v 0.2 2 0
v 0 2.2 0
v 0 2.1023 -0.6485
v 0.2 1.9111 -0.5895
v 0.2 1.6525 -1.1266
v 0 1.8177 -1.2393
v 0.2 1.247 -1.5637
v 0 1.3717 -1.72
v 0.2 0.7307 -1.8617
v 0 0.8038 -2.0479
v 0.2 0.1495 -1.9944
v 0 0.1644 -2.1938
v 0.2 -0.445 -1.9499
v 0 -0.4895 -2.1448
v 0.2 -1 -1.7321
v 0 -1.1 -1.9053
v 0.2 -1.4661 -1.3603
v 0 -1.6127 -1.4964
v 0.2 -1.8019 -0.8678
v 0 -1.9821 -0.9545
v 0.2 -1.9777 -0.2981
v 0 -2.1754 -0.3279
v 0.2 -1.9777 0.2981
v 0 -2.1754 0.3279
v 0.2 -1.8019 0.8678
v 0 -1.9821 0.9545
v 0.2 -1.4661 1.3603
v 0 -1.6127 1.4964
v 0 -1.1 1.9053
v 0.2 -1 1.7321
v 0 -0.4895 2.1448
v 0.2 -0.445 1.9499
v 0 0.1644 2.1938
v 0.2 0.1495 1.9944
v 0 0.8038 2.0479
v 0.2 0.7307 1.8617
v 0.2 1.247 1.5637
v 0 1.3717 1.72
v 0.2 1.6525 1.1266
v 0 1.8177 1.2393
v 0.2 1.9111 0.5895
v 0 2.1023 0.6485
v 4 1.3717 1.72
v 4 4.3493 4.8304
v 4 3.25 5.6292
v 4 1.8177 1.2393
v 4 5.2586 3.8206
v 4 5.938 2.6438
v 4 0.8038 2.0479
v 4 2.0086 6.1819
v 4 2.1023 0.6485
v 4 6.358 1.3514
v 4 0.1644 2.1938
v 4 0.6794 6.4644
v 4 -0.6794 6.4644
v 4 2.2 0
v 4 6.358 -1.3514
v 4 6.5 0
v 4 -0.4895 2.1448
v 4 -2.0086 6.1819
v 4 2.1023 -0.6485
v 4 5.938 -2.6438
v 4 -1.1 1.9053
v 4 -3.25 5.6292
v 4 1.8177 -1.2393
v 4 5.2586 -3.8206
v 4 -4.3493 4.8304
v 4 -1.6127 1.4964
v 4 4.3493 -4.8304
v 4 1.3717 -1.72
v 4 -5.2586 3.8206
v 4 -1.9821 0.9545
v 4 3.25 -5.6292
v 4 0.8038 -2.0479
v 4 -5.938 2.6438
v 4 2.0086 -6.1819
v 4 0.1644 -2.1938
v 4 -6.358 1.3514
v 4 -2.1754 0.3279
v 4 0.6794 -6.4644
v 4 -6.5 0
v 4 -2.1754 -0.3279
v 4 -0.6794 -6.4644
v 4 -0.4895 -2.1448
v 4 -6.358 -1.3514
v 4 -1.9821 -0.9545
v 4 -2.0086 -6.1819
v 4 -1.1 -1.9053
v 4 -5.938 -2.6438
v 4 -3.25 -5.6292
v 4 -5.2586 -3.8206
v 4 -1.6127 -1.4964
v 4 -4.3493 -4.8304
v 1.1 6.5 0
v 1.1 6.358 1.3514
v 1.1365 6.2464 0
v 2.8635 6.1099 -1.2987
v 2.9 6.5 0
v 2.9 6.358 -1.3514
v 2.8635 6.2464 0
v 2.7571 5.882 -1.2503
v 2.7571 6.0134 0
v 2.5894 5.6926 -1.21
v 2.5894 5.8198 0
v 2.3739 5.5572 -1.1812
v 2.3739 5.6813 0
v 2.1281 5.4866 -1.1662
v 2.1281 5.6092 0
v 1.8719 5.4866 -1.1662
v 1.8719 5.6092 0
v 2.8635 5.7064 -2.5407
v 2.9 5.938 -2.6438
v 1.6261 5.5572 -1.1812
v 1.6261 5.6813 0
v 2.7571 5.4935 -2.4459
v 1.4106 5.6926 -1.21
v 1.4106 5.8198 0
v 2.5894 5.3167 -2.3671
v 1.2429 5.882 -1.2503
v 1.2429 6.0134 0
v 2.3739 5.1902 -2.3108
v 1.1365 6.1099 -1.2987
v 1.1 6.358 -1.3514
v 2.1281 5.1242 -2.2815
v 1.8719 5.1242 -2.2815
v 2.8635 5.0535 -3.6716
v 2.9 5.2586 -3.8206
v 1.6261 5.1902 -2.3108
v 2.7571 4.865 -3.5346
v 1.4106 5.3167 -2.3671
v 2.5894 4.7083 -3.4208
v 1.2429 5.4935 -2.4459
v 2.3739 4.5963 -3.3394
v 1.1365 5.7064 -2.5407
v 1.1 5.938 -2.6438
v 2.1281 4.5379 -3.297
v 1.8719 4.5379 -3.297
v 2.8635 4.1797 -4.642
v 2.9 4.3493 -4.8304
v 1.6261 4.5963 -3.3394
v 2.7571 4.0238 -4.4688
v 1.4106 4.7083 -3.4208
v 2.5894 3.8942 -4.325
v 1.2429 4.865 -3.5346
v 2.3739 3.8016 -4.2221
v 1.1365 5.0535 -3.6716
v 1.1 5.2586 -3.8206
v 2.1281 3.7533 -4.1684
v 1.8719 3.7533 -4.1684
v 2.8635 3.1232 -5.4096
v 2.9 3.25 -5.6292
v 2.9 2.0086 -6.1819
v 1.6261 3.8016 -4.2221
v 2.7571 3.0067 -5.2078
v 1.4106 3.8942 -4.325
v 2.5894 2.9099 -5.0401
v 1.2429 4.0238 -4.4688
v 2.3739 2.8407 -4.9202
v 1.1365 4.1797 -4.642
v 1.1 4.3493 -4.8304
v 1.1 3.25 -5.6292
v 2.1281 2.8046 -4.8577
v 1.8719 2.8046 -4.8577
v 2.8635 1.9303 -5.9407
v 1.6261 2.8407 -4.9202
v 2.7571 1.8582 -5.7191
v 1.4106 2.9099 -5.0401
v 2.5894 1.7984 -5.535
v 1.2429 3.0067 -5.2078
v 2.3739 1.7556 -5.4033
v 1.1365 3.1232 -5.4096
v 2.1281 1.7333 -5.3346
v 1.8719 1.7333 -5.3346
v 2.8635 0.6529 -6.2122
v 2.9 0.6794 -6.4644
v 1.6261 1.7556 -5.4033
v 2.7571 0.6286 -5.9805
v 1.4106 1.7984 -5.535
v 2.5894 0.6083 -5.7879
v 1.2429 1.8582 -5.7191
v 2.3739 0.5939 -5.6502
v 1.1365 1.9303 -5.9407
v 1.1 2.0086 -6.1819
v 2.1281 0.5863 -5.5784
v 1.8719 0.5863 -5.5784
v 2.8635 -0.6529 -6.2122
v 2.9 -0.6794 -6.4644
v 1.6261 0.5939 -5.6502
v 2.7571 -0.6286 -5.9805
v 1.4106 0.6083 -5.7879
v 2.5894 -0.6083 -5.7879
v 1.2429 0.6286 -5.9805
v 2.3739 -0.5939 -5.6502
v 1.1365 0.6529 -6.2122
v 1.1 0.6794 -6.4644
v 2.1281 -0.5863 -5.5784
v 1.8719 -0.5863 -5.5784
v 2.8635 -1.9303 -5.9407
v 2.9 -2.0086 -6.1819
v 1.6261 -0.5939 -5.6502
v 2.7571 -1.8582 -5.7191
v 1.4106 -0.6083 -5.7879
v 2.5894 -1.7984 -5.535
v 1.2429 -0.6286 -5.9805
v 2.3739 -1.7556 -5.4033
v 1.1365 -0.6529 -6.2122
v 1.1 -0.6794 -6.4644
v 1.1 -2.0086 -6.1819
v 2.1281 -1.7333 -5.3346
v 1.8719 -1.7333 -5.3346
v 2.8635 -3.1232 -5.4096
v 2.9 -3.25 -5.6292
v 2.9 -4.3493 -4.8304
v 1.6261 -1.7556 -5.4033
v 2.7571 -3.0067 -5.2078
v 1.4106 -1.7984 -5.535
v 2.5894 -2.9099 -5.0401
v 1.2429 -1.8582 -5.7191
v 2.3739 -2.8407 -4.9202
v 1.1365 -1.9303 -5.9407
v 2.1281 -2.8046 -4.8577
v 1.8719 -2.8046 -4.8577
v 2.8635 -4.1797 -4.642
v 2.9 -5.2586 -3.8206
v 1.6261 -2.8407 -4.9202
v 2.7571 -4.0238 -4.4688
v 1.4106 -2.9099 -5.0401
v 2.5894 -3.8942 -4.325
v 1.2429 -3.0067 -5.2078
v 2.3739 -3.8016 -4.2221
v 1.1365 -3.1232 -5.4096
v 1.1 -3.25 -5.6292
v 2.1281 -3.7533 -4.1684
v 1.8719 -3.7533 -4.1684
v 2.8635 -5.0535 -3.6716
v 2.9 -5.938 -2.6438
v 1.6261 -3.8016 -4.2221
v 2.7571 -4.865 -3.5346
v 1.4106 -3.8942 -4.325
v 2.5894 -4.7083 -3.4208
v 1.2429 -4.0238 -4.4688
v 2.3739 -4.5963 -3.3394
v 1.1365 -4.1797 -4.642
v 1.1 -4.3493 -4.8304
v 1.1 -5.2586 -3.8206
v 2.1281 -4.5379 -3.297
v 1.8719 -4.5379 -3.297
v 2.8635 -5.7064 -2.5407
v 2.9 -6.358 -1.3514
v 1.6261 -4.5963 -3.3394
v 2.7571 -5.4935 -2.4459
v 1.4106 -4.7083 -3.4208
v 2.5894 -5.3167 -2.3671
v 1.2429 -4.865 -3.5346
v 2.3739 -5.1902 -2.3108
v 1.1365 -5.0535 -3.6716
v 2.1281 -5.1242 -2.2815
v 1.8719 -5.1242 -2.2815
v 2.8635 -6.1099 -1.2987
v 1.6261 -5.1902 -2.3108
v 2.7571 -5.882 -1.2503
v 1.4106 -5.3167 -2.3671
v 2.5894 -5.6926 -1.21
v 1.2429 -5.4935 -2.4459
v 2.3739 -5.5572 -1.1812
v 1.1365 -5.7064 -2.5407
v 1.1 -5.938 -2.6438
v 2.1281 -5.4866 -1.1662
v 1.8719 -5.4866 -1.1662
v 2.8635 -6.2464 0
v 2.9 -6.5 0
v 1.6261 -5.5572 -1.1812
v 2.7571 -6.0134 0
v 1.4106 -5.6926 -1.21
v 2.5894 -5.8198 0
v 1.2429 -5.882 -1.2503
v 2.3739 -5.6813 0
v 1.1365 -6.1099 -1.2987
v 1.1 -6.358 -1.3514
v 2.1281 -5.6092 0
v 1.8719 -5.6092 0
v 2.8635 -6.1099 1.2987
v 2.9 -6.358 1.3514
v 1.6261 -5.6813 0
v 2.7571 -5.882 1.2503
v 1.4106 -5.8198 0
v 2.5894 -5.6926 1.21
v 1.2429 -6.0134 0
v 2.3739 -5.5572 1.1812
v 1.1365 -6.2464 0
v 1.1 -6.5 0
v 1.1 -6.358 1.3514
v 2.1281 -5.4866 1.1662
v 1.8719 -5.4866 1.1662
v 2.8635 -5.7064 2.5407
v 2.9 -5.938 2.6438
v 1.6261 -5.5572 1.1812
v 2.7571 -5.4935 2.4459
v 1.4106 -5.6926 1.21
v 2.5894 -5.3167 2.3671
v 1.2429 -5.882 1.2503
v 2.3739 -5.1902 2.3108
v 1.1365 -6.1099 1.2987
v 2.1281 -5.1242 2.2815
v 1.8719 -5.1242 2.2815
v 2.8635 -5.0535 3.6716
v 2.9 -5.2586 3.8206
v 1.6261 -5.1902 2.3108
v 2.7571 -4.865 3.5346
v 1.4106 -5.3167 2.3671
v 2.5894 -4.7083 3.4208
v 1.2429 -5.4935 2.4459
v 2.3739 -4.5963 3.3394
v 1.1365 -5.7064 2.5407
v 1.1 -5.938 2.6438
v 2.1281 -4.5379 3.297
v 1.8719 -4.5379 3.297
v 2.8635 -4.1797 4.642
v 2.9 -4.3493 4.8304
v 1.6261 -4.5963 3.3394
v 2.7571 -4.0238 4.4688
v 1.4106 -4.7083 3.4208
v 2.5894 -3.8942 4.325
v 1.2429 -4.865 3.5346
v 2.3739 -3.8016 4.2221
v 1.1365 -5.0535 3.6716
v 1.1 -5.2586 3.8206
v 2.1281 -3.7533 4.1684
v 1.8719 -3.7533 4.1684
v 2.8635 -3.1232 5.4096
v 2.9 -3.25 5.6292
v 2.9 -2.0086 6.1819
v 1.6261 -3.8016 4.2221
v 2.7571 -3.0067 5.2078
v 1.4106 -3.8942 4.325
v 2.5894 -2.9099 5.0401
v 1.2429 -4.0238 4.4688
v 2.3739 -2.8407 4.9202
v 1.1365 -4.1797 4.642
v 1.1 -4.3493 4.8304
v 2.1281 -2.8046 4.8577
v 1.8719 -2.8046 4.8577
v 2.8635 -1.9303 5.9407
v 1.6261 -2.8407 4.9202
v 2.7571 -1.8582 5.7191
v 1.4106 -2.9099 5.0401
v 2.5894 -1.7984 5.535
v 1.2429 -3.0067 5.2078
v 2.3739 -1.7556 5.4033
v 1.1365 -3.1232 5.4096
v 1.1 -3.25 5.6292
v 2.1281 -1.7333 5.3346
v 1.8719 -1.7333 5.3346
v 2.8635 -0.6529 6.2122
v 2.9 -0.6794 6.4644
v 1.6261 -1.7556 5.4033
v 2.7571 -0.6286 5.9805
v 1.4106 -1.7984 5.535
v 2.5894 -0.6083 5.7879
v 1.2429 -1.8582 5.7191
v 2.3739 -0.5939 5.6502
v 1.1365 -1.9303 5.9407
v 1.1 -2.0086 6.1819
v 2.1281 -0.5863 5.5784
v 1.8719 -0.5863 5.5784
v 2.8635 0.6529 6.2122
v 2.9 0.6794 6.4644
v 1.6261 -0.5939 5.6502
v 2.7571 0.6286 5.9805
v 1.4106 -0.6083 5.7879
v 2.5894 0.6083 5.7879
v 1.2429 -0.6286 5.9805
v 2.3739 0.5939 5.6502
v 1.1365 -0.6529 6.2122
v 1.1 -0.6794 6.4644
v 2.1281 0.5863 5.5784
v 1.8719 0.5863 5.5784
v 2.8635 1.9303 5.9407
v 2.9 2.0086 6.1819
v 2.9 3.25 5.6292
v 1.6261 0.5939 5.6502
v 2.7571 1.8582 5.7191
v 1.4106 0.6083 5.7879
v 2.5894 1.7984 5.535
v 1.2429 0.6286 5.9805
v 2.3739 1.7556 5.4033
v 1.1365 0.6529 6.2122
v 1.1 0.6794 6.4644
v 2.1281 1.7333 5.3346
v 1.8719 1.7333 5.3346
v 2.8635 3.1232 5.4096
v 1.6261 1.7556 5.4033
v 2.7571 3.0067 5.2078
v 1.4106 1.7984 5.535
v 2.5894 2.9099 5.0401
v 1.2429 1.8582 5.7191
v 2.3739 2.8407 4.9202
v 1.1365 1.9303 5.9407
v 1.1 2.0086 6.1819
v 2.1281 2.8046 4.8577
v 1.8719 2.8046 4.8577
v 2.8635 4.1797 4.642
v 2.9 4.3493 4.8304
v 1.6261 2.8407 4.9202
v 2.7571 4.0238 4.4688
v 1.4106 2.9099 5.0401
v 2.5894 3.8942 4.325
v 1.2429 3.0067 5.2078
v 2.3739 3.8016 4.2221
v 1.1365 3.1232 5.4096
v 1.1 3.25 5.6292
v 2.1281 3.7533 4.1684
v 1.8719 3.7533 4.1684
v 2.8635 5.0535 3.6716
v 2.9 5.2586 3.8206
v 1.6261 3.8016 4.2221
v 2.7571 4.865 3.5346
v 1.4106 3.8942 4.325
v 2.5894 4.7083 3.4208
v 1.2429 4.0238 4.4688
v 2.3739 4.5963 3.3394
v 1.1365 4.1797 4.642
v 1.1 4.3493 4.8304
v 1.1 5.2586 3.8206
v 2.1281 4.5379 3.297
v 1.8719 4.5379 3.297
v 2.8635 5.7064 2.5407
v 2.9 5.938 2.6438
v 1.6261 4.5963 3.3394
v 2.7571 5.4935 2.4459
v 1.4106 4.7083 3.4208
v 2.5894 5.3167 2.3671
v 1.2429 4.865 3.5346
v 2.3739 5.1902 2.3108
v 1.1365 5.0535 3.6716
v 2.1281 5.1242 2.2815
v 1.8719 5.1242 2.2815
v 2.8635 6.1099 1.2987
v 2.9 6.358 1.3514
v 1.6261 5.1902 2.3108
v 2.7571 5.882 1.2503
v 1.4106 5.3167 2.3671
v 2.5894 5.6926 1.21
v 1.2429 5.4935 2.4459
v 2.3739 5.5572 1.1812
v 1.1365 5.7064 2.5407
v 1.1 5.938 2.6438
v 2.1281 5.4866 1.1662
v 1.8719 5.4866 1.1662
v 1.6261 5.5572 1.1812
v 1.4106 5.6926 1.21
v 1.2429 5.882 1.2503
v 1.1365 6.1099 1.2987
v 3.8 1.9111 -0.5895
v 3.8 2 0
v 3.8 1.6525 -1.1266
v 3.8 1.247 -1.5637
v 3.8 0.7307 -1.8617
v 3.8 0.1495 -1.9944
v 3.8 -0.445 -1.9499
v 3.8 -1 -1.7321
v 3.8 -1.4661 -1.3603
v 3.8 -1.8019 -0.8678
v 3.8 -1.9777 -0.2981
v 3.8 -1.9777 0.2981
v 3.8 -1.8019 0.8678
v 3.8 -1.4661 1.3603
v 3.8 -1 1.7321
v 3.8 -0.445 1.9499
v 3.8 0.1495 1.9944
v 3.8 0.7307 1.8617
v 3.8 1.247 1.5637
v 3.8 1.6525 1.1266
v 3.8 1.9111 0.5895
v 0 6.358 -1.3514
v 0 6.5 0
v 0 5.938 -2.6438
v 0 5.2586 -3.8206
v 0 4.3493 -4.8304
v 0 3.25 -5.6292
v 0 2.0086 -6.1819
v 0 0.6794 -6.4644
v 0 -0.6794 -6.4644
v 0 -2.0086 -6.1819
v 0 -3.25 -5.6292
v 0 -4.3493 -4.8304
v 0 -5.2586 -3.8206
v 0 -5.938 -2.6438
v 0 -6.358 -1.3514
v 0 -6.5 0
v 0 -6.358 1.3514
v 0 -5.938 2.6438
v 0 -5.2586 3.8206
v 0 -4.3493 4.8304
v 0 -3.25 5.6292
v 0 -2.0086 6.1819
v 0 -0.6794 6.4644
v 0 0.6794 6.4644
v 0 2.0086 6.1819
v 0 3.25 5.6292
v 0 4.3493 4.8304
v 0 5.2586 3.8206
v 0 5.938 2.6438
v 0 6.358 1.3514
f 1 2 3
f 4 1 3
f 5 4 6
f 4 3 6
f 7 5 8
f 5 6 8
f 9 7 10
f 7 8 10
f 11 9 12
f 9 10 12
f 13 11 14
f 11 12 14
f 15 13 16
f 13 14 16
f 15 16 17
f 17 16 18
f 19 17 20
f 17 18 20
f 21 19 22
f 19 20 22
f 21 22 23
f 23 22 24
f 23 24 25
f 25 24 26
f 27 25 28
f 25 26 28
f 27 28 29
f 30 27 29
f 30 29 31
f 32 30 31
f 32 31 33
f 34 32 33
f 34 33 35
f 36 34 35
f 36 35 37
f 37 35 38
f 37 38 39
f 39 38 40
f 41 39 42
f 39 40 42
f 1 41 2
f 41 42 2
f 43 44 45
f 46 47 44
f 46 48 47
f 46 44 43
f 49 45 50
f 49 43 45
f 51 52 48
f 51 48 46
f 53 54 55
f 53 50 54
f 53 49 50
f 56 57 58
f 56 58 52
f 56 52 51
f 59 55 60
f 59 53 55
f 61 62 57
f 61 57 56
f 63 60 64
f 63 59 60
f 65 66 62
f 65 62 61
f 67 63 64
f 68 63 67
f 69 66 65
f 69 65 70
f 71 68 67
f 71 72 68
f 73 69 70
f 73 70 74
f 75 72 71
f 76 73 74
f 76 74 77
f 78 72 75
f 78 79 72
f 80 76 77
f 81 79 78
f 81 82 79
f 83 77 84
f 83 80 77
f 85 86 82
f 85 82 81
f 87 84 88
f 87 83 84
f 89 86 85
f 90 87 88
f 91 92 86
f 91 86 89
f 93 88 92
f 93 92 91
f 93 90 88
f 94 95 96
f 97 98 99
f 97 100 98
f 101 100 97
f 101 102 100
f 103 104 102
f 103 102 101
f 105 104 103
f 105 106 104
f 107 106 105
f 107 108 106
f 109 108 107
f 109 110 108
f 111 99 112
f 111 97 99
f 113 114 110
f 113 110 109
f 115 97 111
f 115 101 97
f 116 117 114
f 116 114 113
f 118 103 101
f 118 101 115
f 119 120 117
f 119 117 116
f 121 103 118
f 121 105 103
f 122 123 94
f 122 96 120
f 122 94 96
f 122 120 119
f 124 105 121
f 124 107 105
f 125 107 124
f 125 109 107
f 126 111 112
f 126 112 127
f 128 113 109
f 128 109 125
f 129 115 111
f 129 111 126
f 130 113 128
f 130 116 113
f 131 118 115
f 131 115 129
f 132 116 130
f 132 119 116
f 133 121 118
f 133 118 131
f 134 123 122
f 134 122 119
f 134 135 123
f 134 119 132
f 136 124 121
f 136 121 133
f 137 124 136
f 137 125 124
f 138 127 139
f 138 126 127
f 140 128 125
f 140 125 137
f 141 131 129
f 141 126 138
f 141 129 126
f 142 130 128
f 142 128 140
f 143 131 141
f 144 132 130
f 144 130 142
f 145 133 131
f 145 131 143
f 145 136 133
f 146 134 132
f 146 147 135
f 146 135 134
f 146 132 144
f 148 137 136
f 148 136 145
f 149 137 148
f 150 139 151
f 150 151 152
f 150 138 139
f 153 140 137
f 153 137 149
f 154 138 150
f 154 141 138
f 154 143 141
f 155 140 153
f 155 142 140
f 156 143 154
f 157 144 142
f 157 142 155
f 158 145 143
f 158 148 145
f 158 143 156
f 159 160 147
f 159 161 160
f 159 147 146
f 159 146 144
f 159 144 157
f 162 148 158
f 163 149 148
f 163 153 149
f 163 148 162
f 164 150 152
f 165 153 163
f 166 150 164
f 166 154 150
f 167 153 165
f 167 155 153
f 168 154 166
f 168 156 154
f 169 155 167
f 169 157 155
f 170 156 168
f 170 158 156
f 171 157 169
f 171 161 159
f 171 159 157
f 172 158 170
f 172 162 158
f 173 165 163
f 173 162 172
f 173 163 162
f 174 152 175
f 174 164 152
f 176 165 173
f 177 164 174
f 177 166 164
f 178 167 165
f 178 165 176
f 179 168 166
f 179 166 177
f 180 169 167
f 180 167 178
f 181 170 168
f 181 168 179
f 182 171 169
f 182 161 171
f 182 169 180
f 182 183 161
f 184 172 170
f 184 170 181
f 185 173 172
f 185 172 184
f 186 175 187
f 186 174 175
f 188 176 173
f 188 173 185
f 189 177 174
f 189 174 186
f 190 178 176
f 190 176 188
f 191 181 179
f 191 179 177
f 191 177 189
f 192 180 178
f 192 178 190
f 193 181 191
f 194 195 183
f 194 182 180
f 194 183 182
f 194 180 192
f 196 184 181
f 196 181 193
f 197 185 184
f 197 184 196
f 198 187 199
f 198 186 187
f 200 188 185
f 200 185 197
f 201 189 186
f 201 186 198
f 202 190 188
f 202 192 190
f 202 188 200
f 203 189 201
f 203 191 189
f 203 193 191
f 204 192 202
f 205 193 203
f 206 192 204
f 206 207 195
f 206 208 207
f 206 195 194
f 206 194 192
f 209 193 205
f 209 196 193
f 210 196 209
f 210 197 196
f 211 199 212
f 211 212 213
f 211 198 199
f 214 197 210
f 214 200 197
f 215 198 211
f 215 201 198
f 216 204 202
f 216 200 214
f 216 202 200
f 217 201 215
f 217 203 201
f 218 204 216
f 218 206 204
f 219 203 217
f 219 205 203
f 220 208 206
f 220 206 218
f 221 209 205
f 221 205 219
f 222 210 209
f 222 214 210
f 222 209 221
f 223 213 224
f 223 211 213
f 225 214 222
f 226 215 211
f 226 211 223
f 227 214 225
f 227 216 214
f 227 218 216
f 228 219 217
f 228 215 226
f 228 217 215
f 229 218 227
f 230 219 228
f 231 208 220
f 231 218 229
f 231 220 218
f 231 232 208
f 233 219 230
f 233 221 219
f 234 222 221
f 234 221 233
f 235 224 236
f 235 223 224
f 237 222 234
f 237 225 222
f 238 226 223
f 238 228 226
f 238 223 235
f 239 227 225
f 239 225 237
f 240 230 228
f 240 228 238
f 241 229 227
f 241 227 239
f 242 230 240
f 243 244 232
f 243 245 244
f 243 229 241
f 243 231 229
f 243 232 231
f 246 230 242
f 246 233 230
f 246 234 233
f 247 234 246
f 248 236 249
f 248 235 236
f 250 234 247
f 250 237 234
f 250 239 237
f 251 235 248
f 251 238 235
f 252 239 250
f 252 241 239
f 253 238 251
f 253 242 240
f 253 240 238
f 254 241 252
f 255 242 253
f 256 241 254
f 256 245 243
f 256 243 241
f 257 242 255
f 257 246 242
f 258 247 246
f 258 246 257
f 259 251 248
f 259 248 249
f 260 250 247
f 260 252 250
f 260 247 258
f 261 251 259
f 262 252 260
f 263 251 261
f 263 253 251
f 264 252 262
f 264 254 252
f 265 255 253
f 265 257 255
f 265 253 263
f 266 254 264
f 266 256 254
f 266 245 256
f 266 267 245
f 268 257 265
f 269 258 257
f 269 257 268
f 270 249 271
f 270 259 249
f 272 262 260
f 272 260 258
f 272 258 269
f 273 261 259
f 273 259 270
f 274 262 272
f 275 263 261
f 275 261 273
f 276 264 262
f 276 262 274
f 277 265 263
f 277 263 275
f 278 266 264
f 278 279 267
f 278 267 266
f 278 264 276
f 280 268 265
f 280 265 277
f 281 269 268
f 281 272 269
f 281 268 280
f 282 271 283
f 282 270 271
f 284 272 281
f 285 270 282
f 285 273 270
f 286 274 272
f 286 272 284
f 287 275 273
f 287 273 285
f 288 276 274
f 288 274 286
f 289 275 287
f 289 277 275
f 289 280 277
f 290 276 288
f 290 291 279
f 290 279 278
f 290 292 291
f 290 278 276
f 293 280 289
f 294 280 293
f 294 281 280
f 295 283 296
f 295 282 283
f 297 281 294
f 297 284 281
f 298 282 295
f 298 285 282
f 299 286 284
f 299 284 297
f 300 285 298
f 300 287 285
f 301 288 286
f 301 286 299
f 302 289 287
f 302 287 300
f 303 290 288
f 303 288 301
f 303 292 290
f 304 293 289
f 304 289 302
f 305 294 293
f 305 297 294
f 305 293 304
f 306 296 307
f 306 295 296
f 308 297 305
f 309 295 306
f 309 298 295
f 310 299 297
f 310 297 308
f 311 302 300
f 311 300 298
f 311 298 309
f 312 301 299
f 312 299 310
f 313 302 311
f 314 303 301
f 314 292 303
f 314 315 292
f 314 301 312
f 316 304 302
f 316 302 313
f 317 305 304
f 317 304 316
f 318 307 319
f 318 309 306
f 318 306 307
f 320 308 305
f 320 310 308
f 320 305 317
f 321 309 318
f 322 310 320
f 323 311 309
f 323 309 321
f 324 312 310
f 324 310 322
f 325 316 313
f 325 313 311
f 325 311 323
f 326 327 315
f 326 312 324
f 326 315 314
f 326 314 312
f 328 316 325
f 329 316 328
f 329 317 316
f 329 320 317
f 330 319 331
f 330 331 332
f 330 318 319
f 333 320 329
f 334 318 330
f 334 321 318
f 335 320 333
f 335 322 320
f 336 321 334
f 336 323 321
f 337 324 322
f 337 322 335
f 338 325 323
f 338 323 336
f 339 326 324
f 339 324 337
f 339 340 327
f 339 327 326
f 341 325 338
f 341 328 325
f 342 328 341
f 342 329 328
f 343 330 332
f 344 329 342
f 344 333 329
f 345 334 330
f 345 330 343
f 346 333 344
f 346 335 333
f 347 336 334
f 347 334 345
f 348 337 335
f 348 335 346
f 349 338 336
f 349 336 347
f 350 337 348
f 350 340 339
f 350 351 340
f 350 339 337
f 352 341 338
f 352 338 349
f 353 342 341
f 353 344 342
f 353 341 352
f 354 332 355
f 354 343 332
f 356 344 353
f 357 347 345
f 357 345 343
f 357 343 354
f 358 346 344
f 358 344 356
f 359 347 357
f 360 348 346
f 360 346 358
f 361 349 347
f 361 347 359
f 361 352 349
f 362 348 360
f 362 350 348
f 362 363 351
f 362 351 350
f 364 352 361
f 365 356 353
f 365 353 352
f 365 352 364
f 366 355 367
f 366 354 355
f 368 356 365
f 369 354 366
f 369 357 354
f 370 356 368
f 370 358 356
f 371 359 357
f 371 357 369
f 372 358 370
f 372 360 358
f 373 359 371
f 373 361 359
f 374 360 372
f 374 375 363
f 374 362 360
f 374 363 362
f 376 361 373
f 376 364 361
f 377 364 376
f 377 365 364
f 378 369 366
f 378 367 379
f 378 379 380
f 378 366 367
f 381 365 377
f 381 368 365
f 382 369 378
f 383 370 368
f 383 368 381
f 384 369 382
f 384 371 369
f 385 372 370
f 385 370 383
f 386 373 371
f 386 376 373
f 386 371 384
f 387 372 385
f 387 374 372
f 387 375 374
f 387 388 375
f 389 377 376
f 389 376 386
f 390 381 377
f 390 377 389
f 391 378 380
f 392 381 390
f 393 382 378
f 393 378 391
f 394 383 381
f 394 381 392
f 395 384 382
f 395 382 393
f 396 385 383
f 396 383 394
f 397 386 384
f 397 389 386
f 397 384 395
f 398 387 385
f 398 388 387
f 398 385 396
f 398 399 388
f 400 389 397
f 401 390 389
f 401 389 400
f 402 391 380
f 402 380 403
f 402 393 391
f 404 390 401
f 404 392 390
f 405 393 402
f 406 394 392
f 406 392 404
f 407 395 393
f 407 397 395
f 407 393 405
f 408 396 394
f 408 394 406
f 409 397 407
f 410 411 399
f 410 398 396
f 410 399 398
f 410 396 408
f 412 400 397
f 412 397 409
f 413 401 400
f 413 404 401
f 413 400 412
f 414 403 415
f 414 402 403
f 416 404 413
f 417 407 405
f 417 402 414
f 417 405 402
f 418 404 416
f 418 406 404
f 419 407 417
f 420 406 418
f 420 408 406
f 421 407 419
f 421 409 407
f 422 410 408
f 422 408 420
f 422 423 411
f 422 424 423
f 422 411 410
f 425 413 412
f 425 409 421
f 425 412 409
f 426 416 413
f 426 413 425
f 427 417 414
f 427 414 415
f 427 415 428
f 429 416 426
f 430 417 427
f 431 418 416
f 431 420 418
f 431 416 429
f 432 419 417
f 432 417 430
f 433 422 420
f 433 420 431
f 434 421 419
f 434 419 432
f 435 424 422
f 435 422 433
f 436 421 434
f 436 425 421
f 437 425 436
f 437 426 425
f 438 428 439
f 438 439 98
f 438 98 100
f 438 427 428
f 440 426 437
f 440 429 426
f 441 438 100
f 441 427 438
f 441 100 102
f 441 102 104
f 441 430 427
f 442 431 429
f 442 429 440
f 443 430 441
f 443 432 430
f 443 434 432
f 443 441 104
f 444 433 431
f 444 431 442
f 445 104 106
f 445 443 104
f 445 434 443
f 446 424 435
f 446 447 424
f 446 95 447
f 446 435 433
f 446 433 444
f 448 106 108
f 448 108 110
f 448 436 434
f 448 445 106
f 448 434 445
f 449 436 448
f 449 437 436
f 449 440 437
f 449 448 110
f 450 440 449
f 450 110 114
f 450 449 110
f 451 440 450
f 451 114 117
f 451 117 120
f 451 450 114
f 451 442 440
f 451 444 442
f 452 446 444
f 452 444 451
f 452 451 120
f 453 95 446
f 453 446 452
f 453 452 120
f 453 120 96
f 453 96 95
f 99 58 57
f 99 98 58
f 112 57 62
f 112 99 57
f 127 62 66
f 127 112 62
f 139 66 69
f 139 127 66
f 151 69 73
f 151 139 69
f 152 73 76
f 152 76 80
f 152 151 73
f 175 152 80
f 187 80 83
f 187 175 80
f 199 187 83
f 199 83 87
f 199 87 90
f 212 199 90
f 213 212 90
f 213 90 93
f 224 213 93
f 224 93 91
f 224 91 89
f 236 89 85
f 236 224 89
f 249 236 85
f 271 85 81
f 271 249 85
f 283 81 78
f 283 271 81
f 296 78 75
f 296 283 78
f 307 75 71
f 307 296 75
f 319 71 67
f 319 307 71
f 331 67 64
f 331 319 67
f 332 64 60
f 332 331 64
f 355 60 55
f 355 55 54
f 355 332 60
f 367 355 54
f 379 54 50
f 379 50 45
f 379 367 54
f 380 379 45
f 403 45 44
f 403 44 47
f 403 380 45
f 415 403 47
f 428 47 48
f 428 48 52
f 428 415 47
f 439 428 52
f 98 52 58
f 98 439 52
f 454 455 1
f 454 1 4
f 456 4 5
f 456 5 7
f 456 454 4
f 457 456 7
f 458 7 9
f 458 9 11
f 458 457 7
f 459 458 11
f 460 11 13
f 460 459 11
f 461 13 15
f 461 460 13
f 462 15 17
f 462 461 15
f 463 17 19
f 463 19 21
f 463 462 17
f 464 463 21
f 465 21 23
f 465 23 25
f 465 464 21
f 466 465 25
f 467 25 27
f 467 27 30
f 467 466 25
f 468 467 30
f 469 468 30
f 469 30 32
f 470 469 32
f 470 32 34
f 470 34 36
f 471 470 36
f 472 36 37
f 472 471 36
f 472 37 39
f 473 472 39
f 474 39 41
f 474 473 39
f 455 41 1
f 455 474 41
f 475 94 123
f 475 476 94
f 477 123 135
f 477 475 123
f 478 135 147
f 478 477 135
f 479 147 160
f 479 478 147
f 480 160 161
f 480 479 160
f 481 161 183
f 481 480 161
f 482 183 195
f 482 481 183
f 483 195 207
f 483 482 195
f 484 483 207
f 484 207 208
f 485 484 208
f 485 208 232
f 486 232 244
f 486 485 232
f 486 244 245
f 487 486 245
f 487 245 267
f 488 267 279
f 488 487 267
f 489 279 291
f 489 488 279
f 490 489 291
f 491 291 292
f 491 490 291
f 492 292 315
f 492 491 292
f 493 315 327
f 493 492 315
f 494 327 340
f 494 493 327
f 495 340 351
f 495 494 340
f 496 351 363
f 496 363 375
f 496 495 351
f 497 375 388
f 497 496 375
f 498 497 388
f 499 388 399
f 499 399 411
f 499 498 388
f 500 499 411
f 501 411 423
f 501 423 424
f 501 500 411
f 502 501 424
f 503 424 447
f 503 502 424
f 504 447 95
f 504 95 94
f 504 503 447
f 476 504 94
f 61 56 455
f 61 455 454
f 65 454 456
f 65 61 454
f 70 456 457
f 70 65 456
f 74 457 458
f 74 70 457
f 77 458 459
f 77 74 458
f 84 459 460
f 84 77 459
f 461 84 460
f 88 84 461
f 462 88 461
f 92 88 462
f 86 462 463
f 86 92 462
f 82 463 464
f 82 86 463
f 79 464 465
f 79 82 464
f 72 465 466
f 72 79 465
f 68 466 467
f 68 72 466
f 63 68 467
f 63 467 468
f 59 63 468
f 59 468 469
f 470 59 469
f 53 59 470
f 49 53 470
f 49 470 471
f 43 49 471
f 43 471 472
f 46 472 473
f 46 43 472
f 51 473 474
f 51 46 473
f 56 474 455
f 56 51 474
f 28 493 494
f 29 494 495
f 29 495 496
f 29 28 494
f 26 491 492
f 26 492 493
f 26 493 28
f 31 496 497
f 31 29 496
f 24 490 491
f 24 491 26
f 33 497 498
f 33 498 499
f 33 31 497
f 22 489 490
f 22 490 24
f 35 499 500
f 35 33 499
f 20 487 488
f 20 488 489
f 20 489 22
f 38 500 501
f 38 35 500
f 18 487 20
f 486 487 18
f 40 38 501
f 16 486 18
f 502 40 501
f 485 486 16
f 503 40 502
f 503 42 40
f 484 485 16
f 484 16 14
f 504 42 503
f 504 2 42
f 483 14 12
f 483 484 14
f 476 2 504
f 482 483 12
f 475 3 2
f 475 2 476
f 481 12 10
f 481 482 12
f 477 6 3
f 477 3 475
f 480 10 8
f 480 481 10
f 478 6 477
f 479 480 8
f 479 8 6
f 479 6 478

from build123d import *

# Parameters (mm, degrees)
CHAMFER_1_SIZE = 0.2


with BuildPart() as part:
    # Эскиз3 → Повернуть1 (revolve)
    with BuildSketch(Plane.XY):
        with BuildLine():
            Line((0, 2), (4, 2))
            Line((4, 2), (4, 6.5))
            Line((4, 6.5), (2.9, 6.5))
            ThreePointArc((2.9, 6.5), (2, 5.6), (1.1, 6.5))
            Line((1.1, 6.5), (0, 6.5))
            Line((0, 6.5), (0, 2))
        make_face()
    revolve(axis=Axis((7.18815516, 0, 0), (-1, 0, 0)))

    # Фаска1
    chamfer_1_edges = [part.edges().sort_by_distance(p)[0] for p in [
        (4, -2, 0),
        (0, -2, 0),
    ]]
    chamfer(chamfer_1_edges, length=CHAMFER_1_SIZE)


solid = part.part
